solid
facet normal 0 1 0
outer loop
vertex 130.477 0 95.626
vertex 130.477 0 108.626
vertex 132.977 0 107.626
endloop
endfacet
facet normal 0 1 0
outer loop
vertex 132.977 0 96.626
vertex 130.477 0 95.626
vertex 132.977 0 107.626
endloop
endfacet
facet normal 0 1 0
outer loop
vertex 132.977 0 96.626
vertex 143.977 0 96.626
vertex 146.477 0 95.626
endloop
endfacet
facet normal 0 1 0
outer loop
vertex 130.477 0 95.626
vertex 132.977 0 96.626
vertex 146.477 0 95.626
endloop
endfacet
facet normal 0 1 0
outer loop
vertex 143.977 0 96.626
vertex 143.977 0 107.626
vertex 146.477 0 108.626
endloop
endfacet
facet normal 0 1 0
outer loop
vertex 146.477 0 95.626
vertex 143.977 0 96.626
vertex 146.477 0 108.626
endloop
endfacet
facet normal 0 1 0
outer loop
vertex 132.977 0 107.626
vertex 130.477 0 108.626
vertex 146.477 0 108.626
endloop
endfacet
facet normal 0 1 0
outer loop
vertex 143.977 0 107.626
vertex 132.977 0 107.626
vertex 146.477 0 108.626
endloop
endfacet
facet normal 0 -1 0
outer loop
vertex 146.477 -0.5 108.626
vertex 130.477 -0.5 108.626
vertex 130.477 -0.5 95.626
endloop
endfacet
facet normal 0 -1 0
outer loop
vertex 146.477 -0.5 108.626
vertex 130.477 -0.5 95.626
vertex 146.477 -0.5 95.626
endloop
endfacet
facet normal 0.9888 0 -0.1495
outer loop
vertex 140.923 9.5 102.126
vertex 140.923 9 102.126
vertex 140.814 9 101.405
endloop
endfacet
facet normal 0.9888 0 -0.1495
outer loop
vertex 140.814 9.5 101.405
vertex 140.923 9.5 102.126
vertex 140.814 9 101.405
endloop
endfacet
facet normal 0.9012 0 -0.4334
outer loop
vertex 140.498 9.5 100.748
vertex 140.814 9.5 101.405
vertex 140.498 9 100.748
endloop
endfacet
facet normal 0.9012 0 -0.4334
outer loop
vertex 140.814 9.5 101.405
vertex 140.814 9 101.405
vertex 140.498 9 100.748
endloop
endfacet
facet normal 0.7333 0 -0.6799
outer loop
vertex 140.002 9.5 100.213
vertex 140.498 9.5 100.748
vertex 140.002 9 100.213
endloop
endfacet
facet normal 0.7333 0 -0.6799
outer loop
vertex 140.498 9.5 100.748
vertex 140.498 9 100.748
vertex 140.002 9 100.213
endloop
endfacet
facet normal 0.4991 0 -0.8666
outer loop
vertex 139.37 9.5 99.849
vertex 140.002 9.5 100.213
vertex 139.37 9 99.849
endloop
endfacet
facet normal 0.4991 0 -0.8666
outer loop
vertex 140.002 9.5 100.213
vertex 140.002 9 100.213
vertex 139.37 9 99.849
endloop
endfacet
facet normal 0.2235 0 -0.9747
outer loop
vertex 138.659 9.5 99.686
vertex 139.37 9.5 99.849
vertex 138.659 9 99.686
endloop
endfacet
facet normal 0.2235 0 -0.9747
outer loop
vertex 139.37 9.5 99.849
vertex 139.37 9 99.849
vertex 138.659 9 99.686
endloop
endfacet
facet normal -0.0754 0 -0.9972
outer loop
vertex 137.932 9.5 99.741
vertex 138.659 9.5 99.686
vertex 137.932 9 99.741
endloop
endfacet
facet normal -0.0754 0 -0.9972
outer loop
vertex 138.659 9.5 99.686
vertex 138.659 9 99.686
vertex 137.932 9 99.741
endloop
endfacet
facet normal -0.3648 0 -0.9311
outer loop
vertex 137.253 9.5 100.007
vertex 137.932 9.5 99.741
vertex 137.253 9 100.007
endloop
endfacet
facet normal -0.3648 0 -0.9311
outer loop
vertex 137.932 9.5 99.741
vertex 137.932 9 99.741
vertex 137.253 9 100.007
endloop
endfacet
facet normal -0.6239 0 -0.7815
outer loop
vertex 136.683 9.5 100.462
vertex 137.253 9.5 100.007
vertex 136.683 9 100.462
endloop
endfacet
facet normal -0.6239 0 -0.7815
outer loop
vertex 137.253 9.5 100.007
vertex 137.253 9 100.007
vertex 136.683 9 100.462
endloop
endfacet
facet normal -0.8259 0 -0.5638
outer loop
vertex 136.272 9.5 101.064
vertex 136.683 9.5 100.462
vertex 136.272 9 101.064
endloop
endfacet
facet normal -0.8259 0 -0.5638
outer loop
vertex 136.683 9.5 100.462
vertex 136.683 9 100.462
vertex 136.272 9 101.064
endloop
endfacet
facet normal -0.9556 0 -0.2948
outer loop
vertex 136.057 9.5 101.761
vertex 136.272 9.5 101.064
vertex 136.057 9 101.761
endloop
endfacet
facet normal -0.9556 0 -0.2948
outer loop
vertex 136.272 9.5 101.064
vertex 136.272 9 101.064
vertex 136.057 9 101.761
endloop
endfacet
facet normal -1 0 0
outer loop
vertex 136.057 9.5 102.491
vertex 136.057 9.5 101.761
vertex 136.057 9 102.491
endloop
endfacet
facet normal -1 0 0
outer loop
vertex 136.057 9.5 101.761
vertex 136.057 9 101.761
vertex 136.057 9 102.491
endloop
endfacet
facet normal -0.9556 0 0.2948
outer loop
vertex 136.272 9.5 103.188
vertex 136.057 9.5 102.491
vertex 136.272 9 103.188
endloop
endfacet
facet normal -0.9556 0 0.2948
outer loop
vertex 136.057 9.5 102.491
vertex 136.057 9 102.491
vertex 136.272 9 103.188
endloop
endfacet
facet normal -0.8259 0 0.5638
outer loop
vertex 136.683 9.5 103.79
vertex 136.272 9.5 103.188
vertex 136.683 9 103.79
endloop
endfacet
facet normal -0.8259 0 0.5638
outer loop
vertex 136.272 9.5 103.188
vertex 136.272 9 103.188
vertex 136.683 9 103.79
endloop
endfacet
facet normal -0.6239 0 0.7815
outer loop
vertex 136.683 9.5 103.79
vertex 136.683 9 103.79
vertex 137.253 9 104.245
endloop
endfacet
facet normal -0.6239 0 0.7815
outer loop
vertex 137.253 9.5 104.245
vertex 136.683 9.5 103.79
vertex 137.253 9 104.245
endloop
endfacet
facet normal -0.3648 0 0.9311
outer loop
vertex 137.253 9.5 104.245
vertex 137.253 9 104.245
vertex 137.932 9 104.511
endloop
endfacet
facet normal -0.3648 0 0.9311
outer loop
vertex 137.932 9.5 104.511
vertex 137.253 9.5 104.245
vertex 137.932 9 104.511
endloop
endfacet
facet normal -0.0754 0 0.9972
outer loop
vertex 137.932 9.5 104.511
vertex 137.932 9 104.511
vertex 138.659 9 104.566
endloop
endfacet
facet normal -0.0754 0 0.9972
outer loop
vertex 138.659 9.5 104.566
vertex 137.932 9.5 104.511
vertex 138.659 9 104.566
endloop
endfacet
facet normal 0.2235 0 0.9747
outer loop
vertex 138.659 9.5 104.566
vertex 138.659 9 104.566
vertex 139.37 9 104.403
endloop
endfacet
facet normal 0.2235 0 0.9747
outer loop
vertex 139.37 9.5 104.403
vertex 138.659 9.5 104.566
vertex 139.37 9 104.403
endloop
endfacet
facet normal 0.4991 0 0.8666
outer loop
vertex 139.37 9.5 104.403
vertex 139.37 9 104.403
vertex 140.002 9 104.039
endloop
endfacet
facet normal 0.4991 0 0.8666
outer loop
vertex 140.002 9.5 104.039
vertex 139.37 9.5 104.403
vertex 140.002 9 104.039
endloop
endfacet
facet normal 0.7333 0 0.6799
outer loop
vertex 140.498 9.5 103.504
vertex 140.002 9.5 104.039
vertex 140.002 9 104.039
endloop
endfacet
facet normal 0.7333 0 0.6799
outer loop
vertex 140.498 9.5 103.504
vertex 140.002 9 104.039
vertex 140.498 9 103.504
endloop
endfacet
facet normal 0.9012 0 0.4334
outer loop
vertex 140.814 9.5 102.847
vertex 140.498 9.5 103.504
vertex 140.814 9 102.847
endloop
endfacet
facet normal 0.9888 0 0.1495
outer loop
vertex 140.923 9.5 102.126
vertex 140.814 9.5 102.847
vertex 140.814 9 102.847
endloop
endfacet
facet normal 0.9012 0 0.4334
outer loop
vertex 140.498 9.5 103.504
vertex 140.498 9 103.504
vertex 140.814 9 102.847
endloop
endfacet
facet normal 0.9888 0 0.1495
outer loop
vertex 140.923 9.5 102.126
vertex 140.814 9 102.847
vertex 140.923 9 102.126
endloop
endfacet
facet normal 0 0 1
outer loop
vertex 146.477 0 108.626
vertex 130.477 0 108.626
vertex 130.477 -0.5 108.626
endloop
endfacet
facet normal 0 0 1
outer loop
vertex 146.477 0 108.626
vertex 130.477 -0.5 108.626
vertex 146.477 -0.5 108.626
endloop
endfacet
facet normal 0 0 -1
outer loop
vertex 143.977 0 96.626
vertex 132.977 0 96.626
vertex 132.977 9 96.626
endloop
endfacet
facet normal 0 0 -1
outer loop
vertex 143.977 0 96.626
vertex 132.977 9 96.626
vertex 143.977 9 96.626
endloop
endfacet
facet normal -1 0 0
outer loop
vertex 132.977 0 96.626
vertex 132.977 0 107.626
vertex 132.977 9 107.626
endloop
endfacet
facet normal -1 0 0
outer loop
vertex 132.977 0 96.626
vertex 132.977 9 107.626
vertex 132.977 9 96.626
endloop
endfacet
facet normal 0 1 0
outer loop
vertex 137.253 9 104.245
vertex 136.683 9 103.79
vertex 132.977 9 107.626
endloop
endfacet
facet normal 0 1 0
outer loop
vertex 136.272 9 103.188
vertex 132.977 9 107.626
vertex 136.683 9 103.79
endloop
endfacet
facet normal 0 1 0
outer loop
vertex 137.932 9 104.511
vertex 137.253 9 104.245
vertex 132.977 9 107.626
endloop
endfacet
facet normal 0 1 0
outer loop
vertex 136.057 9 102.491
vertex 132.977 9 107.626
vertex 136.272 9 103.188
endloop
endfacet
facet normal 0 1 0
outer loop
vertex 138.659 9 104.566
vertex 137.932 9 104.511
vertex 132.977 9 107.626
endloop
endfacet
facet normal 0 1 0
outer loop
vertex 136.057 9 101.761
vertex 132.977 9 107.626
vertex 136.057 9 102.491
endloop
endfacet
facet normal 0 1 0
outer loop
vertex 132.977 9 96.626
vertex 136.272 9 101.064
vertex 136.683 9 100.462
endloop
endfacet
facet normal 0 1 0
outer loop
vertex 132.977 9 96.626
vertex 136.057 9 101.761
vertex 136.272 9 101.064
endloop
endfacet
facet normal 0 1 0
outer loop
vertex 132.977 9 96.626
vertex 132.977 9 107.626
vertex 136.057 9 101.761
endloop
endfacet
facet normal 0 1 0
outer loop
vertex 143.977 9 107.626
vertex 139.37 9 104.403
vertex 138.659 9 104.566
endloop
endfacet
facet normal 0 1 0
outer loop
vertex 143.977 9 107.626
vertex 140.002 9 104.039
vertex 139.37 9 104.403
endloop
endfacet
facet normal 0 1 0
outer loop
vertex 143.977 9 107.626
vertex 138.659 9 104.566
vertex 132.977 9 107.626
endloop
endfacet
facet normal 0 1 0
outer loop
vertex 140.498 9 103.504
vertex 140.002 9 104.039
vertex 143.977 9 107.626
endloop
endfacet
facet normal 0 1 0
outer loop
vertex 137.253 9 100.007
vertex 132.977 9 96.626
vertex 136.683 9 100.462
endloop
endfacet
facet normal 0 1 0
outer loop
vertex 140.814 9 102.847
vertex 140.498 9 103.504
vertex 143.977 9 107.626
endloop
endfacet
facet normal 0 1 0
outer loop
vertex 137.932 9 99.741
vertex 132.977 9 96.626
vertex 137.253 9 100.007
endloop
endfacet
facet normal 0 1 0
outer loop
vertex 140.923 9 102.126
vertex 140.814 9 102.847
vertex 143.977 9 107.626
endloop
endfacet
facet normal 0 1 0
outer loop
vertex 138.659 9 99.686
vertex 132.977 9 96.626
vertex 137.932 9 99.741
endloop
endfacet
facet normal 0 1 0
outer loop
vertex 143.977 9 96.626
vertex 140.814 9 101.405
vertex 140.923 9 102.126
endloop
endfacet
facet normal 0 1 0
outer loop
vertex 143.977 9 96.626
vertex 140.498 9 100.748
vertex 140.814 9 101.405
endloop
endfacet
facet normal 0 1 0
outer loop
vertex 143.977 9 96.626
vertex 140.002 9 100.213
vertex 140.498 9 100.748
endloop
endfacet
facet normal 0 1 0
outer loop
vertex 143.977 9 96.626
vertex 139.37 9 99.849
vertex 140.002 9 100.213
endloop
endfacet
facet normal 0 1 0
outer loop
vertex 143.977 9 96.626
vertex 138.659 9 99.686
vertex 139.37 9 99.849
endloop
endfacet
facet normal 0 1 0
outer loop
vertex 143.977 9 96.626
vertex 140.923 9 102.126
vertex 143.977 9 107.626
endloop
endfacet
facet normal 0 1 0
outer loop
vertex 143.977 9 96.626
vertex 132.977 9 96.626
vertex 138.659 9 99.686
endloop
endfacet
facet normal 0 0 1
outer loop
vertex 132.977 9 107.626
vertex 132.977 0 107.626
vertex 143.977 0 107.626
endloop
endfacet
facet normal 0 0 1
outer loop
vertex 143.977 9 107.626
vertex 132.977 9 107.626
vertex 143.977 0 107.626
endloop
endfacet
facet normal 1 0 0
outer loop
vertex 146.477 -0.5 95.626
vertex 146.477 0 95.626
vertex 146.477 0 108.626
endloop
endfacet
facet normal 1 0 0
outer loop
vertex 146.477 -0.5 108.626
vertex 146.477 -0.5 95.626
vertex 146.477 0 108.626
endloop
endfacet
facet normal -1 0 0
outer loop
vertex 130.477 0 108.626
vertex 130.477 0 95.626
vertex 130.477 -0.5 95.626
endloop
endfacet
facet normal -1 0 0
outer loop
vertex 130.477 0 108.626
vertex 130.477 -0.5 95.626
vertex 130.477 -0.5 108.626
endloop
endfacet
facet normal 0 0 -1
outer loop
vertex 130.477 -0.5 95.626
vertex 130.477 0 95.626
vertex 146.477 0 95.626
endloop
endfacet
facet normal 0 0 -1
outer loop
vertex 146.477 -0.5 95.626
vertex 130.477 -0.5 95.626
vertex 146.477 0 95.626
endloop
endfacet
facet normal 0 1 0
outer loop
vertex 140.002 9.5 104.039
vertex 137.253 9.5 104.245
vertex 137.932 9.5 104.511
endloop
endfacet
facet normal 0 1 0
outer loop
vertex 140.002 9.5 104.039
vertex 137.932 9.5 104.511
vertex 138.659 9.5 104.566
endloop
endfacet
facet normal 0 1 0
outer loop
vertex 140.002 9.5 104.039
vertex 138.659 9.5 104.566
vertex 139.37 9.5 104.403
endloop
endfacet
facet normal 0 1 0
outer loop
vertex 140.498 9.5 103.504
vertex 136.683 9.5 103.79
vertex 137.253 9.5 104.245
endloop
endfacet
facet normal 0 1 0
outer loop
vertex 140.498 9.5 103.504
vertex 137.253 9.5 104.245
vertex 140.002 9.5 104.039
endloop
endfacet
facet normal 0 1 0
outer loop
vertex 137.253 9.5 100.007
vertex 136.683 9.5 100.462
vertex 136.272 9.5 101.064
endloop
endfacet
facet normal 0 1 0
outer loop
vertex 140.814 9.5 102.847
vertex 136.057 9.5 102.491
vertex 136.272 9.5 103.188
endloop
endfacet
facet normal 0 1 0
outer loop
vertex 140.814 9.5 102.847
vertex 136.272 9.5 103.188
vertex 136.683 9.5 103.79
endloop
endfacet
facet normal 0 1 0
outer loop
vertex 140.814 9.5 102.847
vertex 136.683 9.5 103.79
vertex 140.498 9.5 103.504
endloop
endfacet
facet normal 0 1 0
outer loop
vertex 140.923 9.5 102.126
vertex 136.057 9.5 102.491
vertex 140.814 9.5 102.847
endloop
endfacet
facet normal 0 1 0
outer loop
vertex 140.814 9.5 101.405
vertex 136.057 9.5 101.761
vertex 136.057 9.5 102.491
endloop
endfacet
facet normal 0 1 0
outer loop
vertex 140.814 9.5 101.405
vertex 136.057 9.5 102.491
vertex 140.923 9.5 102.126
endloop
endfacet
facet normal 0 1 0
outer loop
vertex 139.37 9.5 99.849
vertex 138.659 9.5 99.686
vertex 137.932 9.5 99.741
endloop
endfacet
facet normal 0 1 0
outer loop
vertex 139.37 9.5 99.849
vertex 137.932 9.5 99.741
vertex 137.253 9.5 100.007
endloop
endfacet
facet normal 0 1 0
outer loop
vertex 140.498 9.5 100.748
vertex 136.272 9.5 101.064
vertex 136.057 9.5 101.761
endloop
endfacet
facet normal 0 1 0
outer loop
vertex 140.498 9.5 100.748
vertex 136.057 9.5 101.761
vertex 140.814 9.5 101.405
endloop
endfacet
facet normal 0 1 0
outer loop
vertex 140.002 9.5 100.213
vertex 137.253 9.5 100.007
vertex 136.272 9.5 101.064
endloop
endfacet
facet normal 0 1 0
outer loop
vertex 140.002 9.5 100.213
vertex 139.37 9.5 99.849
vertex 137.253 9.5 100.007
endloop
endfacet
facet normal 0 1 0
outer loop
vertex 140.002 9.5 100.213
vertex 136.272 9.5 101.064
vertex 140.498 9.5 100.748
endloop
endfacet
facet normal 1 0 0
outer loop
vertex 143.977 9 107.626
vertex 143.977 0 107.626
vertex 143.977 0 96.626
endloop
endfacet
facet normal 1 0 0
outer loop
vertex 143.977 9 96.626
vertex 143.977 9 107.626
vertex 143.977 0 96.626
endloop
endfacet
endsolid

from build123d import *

# Parameters (mm, degrees)
SKETCH1_W           = 11
SKETCH1_H           = 11
BOSS_EXTRUDE1_DEPTH = 9
SKETCH2_W           = 16
SKETCH2_H           = 13
BOSS_EXTRUDE2_DEPTH = 0.5
SKETCH3_R           = 2.446587027
BOSS_EXTRUDE3_DEPTH = 0.5


with BuildPart() as part:
    # Sketch1 → Boss-Extrude1 (new body)
    with BuildSketch(Plane(origin=(0, 0, 0), x_dir=(1, 0, 0), z_dir=(0, 1, 0))):
        with Locations((138.476530612, -102.126020408)):
            Rectangle(SKETCH1_W, SKETCH1_H)
    extrude(amount=BOSS_EXTRUDE1_DEPTH)

    # Sketch2 → Boss-Extrude2 (add)
    with BuildSketch(Plane.XZ):
        with Locations((138.476530612, 102.126020408)):
            Rectangle(SKETCH2_W, SKETCH2_H)
    extrude(amount=BOSS_EXTRUDE2_DEPTH)

    # Sketch3 → Boss-Extrude3 (add)
    with BuildSketch(Plane(origin=(0, 9, 0), x_dir=(1, 0, 0), z_dir=(0, 1, 0))):
        with Locations((138.476530612, -102.126020408)):
            Circle(SKETCH3_R)
    extrude(amount=BOSS_EXTRUDE3_DEPTH)


solid = part.part
